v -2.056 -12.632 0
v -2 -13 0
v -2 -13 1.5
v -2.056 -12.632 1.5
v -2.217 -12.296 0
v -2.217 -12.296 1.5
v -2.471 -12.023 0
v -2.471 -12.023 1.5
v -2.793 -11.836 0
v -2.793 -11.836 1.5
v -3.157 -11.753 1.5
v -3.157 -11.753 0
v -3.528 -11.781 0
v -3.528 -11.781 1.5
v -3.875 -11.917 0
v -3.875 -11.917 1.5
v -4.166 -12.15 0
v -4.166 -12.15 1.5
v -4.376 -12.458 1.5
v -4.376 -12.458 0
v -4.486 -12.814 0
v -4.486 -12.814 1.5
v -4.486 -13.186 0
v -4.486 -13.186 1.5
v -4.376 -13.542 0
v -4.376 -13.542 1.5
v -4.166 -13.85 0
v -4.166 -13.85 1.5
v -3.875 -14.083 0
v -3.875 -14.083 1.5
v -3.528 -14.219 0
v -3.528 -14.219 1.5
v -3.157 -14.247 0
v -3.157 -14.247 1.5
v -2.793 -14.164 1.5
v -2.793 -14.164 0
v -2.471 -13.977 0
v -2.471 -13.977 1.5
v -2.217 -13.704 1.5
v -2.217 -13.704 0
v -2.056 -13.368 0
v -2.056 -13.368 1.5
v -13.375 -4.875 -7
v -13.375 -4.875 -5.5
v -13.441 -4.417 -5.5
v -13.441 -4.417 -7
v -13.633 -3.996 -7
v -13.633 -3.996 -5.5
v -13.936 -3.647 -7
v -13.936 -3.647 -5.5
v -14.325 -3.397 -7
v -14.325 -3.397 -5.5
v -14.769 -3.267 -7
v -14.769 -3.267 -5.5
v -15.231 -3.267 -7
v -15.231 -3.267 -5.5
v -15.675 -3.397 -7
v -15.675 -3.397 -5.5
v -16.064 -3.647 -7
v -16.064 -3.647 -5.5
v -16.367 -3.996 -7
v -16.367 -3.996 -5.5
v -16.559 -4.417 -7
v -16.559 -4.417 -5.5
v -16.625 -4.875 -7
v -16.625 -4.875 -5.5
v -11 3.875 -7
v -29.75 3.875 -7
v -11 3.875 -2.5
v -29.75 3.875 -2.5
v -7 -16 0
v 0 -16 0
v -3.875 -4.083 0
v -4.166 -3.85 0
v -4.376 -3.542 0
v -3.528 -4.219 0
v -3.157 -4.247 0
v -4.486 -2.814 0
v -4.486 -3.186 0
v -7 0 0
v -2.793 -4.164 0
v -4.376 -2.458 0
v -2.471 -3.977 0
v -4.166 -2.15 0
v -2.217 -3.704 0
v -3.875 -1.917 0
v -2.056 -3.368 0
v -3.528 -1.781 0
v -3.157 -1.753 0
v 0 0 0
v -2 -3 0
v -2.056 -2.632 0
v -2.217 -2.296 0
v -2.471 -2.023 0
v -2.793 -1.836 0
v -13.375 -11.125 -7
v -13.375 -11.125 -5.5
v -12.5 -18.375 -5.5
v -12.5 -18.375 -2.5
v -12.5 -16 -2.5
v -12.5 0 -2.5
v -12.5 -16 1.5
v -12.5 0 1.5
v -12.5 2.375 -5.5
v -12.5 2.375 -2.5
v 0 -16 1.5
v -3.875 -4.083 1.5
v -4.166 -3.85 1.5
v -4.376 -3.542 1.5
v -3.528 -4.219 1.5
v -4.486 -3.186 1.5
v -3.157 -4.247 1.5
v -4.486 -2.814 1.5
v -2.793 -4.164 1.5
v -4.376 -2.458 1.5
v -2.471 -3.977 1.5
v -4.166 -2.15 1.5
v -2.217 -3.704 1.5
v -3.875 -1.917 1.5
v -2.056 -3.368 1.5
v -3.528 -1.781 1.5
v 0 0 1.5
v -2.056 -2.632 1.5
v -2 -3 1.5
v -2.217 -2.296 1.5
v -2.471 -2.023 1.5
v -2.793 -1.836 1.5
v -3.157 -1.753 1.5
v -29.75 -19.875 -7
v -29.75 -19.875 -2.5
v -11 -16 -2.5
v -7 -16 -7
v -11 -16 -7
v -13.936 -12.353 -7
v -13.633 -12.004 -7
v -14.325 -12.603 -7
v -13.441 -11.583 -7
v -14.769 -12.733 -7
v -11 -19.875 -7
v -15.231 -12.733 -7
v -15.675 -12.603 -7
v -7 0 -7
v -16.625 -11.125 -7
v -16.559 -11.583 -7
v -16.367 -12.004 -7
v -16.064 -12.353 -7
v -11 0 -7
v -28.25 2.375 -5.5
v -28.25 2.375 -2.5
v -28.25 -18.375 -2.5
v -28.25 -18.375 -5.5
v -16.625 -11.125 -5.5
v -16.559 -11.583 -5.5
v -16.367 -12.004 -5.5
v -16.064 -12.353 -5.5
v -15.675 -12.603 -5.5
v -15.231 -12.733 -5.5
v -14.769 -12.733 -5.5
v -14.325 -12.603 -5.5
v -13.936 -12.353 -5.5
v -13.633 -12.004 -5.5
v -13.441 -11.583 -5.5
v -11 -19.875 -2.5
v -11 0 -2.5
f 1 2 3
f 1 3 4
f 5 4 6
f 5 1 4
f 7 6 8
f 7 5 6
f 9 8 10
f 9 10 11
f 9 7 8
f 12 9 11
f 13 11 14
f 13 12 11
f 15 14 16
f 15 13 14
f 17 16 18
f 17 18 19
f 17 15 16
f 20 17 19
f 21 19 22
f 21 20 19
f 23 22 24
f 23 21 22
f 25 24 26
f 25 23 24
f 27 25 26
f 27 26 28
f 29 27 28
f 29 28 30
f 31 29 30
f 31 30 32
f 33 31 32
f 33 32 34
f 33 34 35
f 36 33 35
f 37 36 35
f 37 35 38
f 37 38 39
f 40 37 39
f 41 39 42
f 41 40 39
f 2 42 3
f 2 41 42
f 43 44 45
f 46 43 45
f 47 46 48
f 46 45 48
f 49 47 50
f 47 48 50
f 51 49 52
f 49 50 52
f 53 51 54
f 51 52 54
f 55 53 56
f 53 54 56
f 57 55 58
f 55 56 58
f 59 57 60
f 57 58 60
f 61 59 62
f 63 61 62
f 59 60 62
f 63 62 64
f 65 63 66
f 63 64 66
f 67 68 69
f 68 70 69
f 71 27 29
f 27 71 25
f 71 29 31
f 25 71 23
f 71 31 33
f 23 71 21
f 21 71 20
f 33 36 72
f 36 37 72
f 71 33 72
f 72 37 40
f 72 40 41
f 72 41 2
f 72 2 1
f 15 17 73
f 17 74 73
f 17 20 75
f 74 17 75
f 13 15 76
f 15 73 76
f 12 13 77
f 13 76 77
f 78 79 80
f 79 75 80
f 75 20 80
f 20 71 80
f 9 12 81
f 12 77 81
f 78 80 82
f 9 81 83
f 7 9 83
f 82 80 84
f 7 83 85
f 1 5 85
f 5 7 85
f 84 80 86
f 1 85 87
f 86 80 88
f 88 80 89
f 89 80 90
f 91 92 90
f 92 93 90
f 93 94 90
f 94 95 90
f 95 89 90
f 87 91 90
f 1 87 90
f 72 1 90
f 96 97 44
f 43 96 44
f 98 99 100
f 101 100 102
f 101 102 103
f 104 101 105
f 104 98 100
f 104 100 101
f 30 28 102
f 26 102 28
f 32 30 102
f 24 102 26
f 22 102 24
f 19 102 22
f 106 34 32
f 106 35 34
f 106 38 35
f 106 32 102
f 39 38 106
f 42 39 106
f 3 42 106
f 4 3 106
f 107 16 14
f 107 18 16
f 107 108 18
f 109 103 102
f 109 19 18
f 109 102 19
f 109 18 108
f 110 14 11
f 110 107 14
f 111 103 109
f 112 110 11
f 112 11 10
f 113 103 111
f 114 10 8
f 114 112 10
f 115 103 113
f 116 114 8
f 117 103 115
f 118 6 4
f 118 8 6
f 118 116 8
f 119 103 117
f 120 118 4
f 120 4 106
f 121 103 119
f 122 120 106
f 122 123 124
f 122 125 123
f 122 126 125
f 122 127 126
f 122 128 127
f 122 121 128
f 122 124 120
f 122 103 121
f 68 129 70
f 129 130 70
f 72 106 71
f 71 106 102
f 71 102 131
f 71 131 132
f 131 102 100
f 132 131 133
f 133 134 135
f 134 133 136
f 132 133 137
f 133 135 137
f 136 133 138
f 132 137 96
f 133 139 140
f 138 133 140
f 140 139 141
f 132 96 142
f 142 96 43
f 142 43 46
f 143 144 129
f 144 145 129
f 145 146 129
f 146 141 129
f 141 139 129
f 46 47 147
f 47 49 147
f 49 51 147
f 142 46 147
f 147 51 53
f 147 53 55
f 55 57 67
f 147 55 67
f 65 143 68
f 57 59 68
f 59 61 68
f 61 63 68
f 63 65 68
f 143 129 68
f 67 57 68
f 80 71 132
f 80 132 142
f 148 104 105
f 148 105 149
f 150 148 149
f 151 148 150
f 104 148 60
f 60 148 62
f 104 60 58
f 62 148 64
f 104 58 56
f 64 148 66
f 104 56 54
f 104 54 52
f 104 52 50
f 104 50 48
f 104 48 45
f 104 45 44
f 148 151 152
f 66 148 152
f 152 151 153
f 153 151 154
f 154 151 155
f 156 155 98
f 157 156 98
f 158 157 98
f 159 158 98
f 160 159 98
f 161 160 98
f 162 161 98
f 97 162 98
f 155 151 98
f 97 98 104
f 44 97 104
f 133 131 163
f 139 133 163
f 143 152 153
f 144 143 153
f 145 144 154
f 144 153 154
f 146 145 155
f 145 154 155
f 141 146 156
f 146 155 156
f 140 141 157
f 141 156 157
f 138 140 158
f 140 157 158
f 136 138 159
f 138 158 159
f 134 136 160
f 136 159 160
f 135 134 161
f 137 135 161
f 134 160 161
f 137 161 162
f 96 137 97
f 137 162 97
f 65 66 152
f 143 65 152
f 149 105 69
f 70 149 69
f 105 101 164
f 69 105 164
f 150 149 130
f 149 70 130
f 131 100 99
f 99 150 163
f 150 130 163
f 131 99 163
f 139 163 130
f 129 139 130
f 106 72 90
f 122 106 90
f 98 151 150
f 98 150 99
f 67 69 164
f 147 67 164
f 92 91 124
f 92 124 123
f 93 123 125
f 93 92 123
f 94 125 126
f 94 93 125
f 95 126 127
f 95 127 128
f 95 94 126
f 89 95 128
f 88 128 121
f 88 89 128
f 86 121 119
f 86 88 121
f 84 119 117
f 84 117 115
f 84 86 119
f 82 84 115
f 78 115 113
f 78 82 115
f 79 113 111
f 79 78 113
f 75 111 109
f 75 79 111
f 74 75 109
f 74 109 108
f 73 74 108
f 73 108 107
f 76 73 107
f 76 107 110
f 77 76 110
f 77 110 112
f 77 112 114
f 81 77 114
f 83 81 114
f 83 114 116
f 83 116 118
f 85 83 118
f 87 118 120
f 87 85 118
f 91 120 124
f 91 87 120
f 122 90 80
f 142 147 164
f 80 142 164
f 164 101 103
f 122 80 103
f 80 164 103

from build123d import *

# Parameters (mm, degrees)
F0_W     = 12.5
F0_H     = 16
F0_R     = 1.25
F1_DEPTH = 1.5
F2_W     = 1.5
F2_H     = 16
F3_DEPTH = 5.5
F5_DEPTH = 3
F4_W     = 1.5
F4_H     = 16
F6_DEPTH = 1.5
F8_DEPTH = 4


# Not quite as in the source:
# - a feature of the source that left no trace in its solid (it failed there, or was rolled back) is left out


with BuildPart() as f1:
    # F0 (on Top) → F1 (new body)
    with BuildSketch(Plane.XY):
        with Locations((-6.25, -8)):
            Rectangle(F0_W, F0_H)
        with Locations((-3.25, -13)):
            Circle(F0_R, mode=Mode.SUBTRACT)
        with Locations((-3.25, -3)):
            Circle(F0_R, mode=Mode.SUBTRACT)
    extrude(amount=F1_DEPTH)

    # F2 (on face) → F3 (join)
    with BuildSketch(Plane(origin=(0, 0, 0), x_dir=(1, 0, 0), z_dir=(0, 0, -1))):
        with Locations((-11.75, 8)):
            Rectangle(F2_W, F2_H)
    extrude(amount=F3_DEPTH)

    # F4 (on face) → F5 (join)
    with BuildSketch(Plane(origin=(0, 0, -5.5), x_dir=(1, 0, 0), z_dir=(0, 0, -1))):
        Polygon((-11, 16), (-11, 19.875), (-29.75, 19.875), (-29.75, -3.875), (-11, -3.875), (-11, 0), (-12.5, 0), (-12.5, -2.375), (-28.25, -2.375), (-28.25, 18.375), (-12.5, 18.375), (-12.5, 16), align=None)
    extrude(amount=-F5_DEPTH)

    # F4 (on face) → F6 (join)
    with BuildSketch(Plane(origin=(0, 0, -5.5), x_dir=(1, 0, 0), z_dir=(0, 0, -1))):
        Polygon((-11, 16), (-11, 19.875), (-29.75, 19.875), (-29.75, -3.875), (-11, -3.875), (-11, 0), (-12.5, 0), (-12.5, -2.375), (-28.25, -2.375), (-28.25, 18.375), (-12.5, 18.375), (-12.5, 16), align=None)
        with Locations((-11.75, 8)):
            Rectangle(F4_W, F4_H)
        Polygon((-12.5, 0), (-12.5, 16), (-12.5, 18.375), (-28.25, 18.375), (-28.25, -2.375), (-12.5, -2.375), align=None)
        with BuildLine():
            Line((-13.375, 11.125), (-13.375, 4.875))
            ThreePointArc((-13.375, 4.875), (-15, 3.25), (-16.625, 4.875))
            Line((-16.625, 4.875), (-16.625, 11.125))
            ThreePointArc((-16.625, 11.125), (-15, 12.75), (-13.375, 11.125))
        make_face(mode=Mode.SUBTRACT)
    extrude(amount=F6_DEPTH)

    # F7 (on face) → F8 (join)
    with BuildSketch(Plane.YZ.offset(-11)):
        Polygon((0, 0), (-16, 0), (-16, -2.5), (-16, -7), (0, -7), (0, -2.5), align=None)
    extrude(amount=F8_DEPTH)


solid = f1.part
